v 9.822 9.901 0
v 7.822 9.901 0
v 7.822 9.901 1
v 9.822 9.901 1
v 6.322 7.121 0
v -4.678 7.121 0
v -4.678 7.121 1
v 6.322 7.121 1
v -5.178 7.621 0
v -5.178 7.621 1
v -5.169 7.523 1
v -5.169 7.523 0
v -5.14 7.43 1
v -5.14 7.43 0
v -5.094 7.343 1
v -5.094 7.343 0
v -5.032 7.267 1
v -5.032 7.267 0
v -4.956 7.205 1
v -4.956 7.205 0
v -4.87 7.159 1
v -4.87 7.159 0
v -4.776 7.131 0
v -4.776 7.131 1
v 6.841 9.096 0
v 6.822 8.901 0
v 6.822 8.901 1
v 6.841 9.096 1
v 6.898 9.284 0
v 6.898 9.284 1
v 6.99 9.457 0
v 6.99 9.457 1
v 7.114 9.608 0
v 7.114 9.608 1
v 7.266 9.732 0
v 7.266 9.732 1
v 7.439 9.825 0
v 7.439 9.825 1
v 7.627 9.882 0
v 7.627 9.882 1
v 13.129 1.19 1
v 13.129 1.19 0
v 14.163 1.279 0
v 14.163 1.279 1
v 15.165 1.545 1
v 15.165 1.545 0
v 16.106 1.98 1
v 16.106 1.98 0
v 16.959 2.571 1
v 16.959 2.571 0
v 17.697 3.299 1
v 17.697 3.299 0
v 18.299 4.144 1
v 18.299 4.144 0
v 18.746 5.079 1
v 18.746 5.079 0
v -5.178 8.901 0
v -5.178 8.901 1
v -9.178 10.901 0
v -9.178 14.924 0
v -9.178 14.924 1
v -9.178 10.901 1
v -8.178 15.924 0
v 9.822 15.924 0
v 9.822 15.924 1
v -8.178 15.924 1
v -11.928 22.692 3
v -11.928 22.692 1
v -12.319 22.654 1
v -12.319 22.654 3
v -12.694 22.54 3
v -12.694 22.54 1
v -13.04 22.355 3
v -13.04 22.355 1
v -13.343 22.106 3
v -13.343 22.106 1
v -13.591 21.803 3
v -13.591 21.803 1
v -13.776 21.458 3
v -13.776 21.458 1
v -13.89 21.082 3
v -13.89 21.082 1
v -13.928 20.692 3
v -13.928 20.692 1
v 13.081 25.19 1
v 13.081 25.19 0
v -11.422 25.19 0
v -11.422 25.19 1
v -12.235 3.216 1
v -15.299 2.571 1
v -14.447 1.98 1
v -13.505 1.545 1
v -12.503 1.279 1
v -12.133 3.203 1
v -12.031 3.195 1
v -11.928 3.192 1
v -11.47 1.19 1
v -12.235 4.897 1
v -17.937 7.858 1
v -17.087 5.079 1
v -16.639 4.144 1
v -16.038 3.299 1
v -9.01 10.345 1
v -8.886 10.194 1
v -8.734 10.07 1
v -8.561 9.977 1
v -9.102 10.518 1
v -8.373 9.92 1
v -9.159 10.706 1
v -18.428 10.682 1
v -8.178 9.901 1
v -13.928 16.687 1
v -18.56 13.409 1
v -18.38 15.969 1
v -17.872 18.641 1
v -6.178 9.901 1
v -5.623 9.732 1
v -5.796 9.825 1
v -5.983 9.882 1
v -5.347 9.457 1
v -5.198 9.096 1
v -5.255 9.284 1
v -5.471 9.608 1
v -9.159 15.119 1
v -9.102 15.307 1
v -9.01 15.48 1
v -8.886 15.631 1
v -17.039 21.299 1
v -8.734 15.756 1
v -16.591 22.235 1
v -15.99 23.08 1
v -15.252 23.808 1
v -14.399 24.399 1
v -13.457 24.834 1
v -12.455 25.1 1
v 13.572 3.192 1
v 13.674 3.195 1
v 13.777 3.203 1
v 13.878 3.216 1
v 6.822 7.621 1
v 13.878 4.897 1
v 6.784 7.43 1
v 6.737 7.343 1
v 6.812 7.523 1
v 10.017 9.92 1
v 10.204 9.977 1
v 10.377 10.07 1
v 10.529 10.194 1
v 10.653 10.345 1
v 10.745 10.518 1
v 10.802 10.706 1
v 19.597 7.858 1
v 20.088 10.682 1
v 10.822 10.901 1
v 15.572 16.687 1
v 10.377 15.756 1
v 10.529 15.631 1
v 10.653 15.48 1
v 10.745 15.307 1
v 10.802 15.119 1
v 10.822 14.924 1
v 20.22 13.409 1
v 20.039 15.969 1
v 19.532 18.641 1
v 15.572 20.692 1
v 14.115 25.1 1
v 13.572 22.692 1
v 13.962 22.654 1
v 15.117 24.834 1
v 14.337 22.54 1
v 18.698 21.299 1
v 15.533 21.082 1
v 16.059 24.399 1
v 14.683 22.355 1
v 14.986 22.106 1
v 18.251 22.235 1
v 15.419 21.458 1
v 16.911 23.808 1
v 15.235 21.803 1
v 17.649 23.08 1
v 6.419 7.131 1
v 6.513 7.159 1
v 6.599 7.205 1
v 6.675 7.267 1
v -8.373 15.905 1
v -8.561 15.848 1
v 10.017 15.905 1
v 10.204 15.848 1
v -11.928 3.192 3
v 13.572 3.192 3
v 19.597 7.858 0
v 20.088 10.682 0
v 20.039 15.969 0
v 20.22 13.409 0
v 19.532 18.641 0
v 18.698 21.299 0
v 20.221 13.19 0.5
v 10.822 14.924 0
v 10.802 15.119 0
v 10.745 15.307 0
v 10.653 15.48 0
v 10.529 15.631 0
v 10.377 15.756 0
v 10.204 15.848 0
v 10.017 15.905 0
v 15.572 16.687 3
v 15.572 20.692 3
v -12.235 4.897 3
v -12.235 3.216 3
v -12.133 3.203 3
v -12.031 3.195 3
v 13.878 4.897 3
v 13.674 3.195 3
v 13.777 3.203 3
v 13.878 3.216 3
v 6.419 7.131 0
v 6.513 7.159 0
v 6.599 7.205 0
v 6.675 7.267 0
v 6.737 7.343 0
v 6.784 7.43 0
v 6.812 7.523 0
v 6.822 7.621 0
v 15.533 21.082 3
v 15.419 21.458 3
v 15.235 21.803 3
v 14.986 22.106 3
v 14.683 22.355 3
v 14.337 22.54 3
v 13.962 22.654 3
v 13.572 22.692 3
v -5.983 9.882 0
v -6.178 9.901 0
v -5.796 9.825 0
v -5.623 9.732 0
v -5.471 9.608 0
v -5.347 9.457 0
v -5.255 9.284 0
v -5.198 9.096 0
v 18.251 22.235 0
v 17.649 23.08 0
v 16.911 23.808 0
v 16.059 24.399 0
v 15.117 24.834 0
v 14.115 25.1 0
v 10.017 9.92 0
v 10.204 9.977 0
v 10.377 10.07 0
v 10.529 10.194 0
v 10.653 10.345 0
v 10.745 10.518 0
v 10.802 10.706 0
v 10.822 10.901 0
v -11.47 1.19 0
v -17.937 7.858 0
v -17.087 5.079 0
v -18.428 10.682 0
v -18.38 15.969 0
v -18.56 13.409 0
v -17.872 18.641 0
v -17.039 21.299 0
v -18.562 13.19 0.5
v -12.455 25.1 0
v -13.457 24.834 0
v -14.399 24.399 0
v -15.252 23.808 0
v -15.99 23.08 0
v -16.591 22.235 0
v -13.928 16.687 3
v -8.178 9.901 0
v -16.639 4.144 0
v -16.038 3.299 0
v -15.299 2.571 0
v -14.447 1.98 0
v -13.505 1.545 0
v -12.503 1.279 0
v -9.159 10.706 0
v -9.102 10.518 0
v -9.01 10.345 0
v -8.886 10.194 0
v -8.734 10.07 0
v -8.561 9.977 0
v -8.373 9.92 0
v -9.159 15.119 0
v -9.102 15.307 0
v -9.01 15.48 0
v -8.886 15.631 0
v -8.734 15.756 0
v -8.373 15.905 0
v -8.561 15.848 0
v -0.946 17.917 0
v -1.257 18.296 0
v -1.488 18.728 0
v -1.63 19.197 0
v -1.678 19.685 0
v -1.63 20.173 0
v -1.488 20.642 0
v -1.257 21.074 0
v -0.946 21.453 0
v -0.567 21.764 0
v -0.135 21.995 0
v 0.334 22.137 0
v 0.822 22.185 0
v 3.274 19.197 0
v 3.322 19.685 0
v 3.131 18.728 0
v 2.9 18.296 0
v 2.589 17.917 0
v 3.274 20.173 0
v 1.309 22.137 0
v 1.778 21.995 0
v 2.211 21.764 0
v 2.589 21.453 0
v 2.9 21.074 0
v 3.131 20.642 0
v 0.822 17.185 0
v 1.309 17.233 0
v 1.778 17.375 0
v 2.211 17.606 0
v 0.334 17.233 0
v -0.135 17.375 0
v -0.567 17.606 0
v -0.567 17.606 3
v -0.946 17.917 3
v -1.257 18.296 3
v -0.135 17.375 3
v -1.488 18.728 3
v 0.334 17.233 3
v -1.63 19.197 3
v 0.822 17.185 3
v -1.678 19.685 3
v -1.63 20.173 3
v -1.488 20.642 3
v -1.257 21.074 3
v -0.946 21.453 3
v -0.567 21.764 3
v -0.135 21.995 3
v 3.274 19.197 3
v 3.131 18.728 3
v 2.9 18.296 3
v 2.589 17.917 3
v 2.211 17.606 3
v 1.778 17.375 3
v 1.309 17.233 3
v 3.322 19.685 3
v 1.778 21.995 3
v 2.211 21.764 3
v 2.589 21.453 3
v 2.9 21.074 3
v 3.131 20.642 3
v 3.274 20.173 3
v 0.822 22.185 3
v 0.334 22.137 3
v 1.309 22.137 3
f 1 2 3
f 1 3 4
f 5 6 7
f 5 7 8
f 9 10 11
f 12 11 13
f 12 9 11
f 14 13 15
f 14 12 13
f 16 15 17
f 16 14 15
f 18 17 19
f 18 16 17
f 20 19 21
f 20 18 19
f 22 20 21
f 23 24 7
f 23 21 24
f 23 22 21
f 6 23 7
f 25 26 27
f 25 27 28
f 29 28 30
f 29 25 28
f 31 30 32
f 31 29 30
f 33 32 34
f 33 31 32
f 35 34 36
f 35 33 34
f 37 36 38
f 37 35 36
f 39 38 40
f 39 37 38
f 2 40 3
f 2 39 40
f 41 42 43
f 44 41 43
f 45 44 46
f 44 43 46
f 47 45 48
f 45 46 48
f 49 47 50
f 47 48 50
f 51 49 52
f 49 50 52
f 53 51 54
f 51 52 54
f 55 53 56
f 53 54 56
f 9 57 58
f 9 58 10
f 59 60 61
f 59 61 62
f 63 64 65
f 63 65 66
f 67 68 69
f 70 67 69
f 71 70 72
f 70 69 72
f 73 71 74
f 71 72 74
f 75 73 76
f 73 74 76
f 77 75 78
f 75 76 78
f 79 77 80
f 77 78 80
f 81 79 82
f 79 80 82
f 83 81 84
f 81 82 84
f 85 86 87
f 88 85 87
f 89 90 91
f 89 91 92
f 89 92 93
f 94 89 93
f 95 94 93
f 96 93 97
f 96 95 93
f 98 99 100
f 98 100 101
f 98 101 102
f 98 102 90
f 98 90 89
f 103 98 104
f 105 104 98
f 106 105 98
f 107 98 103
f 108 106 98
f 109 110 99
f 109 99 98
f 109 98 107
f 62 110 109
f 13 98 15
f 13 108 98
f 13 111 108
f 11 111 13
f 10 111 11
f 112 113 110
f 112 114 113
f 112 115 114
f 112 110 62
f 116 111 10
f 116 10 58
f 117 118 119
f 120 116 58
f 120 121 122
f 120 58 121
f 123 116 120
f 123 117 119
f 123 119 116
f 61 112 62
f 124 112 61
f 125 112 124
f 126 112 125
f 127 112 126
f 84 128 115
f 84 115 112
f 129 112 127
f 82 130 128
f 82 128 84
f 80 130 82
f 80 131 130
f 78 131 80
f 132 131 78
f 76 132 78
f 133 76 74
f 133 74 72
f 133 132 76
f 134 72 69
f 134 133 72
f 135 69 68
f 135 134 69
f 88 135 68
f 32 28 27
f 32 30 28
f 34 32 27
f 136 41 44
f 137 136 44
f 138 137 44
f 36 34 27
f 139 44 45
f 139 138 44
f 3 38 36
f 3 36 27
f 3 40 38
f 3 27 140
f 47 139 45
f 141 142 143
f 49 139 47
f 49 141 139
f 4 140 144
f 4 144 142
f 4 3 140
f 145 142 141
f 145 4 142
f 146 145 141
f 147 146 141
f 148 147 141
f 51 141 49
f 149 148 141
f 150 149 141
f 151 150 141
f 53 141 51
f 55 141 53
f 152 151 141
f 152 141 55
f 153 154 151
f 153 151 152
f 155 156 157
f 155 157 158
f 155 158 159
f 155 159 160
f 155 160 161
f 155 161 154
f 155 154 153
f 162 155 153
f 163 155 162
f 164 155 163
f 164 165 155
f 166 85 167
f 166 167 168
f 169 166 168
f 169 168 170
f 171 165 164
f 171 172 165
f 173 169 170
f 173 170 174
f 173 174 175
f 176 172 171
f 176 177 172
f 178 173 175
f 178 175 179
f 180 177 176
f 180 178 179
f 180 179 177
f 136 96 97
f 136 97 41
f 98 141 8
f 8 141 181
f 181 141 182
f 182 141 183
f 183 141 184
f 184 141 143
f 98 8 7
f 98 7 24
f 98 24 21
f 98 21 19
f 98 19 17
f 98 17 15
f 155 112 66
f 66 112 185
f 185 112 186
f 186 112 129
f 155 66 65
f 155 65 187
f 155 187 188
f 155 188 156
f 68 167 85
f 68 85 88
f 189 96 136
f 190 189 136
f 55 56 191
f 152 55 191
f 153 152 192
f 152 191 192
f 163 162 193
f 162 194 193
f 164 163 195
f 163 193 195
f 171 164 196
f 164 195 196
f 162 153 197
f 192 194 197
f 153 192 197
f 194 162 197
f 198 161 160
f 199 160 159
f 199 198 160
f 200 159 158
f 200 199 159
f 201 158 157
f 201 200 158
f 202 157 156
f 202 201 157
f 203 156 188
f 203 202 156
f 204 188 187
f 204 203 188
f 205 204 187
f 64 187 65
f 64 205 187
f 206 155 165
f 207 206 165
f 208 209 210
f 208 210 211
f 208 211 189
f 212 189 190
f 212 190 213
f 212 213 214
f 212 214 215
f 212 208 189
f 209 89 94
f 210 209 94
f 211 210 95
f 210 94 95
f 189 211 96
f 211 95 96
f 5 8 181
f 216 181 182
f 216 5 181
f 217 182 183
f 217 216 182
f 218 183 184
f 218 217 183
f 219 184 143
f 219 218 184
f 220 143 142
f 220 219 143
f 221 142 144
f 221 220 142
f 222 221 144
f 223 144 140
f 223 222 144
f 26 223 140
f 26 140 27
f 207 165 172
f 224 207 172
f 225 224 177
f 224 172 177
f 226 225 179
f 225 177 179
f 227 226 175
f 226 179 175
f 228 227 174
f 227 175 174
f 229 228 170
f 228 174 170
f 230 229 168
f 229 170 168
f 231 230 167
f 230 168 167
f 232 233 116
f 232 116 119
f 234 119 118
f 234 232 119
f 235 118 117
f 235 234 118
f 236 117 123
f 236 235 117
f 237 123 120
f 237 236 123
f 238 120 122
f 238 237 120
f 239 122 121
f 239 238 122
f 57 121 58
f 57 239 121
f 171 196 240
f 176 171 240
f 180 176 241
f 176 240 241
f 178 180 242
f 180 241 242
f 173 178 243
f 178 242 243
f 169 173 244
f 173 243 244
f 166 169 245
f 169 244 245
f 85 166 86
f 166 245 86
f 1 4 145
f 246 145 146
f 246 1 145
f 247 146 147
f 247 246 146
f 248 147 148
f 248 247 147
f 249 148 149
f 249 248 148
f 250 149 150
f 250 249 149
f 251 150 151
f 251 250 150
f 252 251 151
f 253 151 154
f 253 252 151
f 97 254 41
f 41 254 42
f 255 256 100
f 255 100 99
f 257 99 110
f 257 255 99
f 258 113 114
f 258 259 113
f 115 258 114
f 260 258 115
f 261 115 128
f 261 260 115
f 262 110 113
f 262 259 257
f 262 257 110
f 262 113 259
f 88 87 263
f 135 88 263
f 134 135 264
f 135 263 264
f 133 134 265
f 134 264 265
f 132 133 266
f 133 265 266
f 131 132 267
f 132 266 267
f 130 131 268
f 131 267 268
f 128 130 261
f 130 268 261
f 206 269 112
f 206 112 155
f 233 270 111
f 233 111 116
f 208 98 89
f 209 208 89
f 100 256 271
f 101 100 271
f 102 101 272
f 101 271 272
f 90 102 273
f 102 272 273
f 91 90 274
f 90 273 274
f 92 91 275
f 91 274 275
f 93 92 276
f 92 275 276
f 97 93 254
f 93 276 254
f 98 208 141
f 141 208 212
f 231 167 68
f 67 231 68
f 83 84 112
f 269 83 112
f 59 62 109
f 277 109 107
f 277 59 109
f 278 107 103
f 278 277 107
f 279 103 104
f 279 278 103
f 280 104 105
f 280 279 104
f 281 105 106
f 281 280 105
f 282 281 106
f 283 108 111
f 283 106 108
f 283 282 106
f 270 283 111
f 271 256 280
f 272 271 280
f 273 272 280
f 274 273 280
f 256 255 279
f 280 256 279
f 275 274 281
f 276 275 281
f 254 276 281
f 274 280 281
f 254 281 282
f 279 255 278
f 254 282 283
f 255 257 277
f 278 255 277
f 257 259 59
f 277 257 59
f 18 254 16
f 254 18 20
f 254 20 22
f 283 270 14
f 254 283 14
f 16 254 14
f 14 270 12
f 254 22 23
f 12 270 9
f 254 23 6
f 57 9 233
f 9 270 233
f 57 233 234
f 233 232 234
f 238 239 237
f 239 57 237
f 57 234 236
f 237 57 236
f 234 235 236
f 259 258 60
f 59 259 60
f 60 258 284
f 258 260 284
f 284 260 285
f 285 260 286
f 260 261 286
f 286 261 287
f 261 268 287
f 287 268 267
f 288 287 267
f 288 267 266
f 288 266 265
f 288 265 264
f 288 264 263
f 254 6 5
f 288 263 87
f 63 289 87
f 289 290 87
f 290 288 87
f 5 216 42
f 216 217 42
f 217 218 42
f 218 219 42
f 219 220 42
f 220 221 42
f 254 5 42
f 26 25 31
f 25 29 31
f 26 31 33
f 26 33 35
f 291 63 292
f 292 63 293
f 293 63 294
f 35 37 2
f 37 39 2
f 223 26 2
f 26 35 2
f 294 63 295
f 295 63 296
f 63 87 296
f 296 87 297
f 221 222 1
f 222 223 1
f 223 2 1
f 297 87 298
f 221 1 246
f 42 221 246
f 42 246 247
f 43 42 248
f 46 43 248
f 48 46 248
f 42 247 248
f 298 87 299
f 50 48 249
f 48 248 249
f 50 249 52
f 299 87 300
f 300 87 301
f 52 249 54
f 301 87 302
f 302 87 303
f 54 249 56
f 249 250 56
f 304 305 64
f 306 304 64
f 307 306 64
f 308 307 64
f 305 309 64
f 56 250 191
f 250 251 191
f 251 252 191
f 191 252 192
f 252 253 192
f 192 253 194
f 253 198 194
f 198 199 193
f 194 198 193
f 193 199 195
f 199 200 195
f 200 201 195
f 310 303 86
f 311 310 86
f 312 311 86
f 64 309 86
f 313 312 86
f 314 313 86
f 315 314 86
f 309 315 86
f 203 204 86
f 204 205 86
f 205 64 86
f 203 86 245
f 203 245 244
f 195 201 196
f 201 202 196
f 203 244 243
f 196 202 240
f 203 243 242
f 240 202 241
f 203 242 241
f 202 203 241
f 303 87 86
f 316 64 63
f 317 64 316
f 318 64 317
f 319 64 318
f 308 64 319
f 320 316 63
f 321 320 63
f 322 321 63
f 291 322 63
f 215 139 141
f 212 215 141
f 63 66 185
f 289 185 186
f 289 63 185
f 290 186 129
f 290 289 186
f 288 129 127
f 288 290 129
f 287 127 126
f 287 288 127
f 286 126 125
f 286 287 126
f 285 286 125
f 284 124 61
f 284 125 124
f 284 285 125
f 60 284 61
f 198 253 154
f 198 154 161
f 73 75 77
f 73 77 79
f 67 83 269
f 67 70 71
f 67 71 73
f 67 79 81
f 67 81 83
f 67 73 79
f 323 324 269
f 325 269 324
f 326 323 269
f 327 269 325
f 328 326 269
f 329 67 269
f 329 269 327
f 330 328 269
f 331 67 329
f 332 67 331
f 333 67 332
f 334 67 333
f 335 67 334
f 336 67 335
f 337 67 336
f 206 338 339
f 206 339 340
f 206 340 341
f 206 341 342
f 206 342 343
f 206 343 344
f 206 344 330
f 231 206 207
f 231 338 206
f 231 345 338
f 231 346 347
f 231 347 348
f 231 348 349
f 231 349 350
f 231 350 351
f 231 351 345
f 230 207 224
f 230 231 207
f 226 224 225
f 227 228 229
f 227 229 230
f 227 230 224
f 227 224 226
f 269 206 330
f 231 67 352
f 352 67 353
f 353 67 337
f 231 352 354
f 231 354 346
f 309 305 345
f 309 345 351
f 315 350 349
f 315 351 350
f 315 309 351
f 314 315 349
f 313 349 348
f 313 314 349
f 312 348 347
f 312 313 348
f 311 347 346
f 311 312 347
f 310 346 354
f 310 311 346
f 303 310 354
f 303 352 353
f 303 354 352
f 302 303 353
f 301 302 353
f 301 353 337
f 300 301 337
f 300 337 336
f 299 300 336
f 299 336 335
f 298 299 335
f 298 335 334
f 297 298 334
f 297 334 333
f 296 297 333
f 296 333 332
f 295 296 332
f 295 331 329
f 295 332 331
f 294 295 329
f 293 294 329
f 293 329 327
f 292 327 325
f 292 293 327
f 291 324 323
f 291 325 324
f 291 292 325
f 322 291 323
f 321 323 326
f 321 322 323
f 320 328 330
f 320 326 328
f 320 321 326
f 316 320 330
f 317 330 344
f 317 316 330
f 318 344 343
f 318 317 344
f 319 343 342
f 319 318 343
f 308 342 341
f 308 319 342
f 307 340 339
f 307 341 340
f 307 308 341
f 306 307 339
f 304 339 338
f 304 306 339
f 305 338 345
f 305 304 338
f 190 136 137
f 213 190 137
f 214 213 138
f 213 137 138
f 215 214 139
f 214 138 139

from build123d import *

# Parameters (mm, degrees)
BOSS_EXTRUDE1_DEPTH     = 1
BOSS_EXTRUDE2_DEPTH     = 3
CUT_EXTRUDE3_DEPTH      = 3
SKETCH7_W               = 29.714207492
SKETCH7_H               = 11.789960261
CUT_EXTRUDE4_DEPTH      = 2
CUT_EXTRUDE5_DEPTH      = 33.440982602
CUT_EXTRUDE5_DEPTH_BACK = 33.440982602
SKETCH6_R               = 2.5


with BuildPart() as part:
    # Sketch4 → Boss-Extrude1 (new body)
    with BuildSketch(Plane.XY):
        with BuildLine():
            Line((-11.46999612, 1.189613235), (13.12949411, 1.189613235))
            ThreePointArc((13.12949411, 1.189613235), (16.545477006, 2.256960718), (18.746112986, 5.079259617))
            add(Edge.make_bspline(
                [(18.746112986, 5.079259617), (19.737187318, 7.716962964), (20.720796973, 13.218046534), (19.706022352, 18.616089167), (18.698180615, 21.299335004)],
                knots=[0.167422492, 0.167422492, 0.167422492, 0.167422492, 0.502499344, 0.837905074, 0.837905074, 0.837905074, 0.837905074], degree=3))
            ThreePointArc((18.698180615, 21.299335004), (16.497584709, 24.122073606), (13.081324372, 25.189613235))
            Line((13.081324372, 25.189613235), (-11.421826382, 25.189613235))
            ThreePointArc((-11.421826382, 25.189613235), (-14.838086719, 24.122073606), (-17.038682625, 21.299335004))
            add(Edge.make_bspline(
                [(-17.086614996, 5.079259617), (-18.077689328, 7.716962964), (-19.061298983, 13.218046534), (-18.046524362, 18.616089167), (-17.038682625, 21.299335004)],
                knots=[0.167422492, 0.167422492, 0.167422492, 0.167422492, 0.502499344, 0.837905074, 0.837905074, 0.837905074, 0.837905074], degree=3))
            ThreePointArc((-17.086614996, 5.079259617), (-14.885979016, 2.256960718), (-11.46999612, 1.189613235))
        make_face()
    extrude(amount=BOSS_EXTRUDE1_DEPTH)

    # Sketch1 → Boss-Extrude2 (add)
    with BuildSketch(Plane.XY):
        with BuildLine():
            Line((-11.928396375, 3.192285122), (13.571603625, 3.192285122))
            ThreePointArc((13.571603625, 3.192285122), (13.725432705, 3.198209744), (13.878350405, 3.215948508))
            Line((13.878350405, 3.215948508), (13.878350405, 6.42715263))
            ThreePointArc((13.878350405, 6.42715263), (14.024797015, 6.780706021), (14.378350405, 6.92715263))
            Line((14.378350405, 6.92715263), (15.571603625, 6.92715263))
            Line((15.571603625, 6.92715263), (15.571603625, 20.692285122))
            ThreePointArc((15.571603625, 20.692285122), (14.985817187, 22.106498684), (13.571603625, 22.692285122))
            Line((13.571603625, 22.692285122), (-11.928396375, 22.692285122))
            ThreePointArc((-11.928396375, 22.692285122), (-13.342609938, 22.106498684), (-13.928396375, 20.692285122))
            Line((-13.928396375, 20.692285122), (-13.928396375, 6.92715263))
            Line((-13.928396375, 6.92715263), (-12.735143156, 6.92715263))
            ThreePointArc((-12.735143156, 6.92715263), (-12.381589765, 6.780706021), (-12.235143156, 6.42715263))
            Line((-12.235143156, 6.42715263), (-12.235143156, 3.215948508))
            ThreePointArc((-12.235143156, 3.215948508), (-12.082225455, 3.198209744), (-11.928396375, 3.192285122))
        make_face()
    extrude(amount=BOSS_EXTRUDE2_DEPTH)

    # Sketch2 → Cut-Extrude3 (cut)
    with BuildSketch(Plane.XY):
        with BuildLine():
            Line((-4.678396375, 7.121027254), (6.321603625, 7.121027254))
            ThreePointArc((6.321603625, 7.121027254), (6.675157015, 7.267473863), (6.821603625, 7.621027254))
            Line((6.821603625, 7.621027254), (6.821603625, 8.901007801))
            ThreePointArc((6.821603625, 8.901007801), (7.114496843, 9.608114582), (7.821603625, 9.901007801))
            Line((7.821603625, 9.901007801), (9.821603625, 9.901007801))
            ThreePointArc((9.821603625, 9.901007801), (10.528710406, 10.19390102), (10.821603625, 10.901007801))
            Line((10.821603625, 10.901007801), (10.821603625, 14.92428318))
            ThreePointArc((10.821603625, 14.92428318), (10.528710406, 15.631389961), (9.821603625, 15.92428318))
            Line((9.821603625, 15.92428318), (-8.178396375, 15.92428318))
            ThreePointArc((-8.178396375, 15.92428318), (-8.885503157, 15.631389961), (-9.178396375, 14.92428318))
            Line((-9.178396375, 14.92428318), (-9.178396375, 10.901007801))
            ThreePointArc((-9.178396375, 10.901007801), (-8.885503157, 10.19390102), (-8.178396375, 9.901007801))
            Line((-8.178396375, 9.901007801), (-6.178396375, 9.901007801))
            ThreePointArc((-6.178396375, 9.901007801), (-5.471289594, 9.608114582), (-5.178396375, 8.901007801))
            Line((-5.178396375, 8.901007801), (-5.178396375, 7.621027254))
            ThreePointArc((-5.178396375, 7.621027254), (-5.031949766, 7.267473863), (-4.678396375, 7.121027254))
        make_face()
    extrude(amount=CUT_EXTRUDE3_DEPTH, mode=Mode.SUBTRACT)

    # Sketch7 → Cut-Extrude4 (cut)
    with BuildSketch(Plane.XY.offset(3)):
        with Locations((0.928707371, 10.792421827)):
            Rectangle(SKETCH7_W, SKETCH7_H)
    extrude(amount=-CUT_EXTRUDE4_DEPTH, mode=Mode.SUBTRACT)

    # Sketch6 → Cut-Extrude5 (cut, two sides: drawn at the far end of the back side and taken through both)
    with BuildSketch(Plane.XY.offset(3).offset(-CUT_EXTRUDE5_DEPTH_BACK)):
        with Locations((0.821603625, 19.685063144)):
            Circle(SKETCH6_R)
    extrude(amount=CUT_EXTRUDE5_DEPTH + CUT_EXTRUDE5_DEPTH_BACK, mode=Mode.SUBTRACT)


solid = part.part
